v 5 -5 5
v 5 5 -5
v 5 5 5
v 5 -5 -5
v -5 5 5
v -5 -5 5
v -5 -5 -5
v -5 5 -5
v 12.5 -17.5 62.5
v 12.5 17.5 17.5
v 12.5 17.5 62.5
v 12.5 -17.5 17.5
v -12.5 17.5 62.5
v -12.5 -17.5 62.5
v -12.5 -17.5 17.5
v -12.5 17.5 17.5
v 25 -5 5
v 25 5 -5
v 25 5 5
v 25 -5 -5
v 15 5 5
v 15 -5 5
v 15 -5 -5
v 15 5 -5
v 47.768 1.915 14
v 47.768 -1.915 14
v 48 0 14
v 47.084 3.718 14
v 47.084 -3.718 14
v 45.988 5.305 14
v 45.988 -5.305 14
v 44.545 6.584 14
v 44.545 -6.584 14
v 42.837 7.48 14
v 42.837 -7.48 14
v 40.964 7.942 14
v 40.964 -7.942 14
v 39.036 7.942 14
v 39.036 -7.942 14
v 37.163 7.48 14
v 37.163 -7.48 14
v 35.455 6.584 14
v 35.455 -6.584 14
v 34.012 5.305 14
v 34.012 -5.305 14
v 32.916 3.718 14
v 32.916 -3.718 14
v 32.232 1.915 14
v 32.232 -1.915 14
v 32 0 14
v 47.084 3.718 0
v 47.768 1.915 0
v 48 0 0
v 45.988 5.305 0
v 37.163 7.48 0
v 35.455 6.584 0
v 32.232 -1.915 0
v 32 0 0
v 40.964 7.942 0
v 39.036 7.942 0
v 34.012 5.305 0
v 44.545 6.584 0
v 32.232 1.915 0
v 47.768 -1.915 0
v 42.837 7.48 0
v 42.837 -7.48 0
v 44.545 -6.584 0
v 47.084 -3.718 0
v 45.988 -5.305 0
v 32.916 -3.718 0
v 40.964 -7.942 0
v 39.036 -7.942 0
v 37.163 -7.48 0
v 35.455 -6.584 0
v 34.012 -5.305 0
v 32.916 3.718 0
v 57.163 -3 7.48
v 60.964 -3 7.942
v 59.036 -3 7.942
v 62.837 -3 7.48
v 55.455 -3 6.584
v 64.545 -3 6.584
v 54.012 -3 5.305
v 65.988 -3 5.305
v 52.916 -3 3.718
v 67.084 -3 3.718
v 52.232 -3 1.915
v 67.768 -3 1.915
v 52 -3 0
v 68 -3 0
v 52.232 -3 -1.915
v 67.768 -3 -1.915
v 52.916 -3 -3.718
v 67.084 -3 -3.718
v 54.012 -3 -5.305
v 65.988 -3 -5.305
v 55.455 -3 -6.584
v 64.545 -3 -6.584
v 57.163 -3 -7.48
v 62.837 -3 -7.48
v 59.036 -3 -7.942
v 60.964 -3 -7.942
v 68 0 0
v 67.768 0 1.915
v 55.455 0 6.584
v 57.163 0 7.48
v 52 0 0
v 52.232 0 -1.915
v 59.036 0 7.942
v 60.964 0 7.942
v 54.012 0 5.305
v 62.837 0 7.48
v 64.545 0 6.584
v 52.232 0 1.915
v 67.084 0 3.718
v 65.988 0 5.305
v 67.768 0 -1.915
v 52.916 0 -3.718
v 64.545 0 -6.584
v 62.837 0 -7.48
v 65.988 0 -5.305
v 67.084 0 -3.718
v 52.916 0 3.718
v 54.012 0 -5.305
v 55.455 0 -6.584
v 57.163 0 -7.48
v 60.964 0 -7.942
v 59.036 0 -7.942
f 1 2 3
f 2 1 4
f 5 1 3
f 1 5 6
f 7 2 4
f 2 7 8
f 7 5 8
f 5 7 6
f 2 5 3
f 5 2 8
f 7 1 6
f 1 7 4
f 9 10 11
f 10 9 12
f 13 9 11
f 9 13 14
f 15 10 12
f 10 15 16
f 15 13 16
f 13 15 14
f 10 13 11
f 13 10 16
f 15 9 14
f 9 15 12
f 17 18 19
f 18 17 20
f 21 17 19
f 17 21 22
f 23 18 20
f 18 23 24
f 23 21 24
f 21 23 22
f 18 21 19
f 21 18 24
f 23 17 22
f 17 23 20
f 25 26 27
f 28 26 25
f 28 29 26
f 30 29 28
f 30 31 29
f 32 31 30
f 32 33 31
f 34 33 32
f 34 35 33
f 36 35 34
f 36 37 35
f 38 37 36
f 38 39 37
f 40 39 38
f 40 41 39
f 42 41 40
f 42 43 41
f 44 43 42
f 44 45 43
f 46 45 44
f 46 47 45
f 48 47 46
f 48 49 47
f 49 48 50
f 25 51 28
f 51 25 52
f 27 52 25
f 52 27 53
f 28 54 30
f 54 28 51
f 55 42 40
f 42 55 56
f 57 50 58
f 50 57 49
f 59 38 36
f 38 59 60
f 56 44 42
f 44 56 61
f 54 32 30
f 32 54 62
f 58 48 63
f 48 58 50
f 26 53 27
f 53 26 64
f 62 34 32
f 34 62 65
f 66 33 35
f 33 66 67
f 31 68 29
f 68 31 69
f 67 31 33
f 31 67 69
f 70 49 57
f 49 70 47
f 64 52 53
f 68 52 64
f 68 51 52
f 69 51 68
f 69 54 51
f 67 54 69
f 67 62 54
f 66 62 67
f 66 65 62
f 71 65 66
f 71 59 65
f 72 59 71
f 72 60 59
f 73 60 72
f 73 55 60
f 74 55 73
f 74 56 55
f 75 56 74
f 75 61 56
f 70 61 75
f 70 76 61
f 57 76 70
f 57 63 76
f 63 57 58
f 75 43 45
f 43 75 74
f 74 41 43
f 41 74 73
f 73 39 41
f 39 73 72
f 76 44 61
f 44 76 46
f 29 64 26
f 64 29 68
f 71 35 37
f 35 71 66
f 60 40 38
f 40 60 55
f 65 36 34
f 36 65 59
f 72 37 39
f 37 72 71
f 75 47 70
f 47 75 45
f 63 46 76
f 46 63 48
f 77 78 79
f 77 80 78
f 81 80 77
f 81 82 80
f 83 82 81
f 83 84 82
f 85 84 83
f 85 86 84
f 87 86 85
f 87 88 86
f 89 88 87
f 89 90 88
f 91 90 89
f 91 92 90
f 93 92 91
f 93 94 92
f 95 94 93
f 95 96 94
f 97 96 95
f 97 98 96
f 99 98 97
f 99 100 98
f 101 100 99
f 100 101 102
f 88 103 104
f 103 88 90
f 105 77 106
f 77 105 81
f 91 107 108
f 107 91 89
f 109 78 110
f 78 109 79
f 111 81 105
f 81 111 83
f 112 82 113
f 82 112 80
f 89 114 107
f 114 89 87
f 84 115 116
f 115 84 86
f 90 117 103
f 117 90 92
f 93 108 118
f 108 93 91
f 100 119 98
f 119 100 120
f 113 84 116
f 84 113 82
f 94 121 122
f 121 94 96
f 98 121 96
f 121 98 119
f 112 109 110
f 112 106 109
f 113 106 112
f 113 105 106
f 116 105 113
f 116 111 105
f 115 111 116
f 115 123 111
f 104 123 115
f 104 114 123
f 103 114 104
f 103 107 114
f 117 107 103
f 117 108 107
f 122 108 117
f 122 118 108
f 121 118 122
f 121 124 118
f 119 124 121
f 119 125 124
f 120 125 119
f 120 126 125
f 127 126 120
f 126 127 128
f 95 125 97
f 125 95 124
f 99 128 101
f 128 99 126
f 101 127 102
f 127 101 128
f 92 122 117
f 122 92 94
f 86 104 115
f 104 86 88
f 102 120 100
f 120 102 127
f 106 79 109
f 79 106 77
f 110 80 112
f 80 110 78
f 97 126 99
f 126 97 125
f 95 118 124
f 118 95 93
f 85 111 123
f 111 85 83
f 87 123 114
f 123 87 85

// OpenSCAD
cube(10, center=true);


translate([0, 0, 40]) // 这里不能分号
cube([25,35,45], center=true);


translate([20, 0, 0])
cube(10, center=true);


// 圆柱
translate([40, 0,0])
cylinder(h=14, r=8);


translate([60, 0,0])
rotate([90, 0, 0])
cylinder(h=3,r=8);
